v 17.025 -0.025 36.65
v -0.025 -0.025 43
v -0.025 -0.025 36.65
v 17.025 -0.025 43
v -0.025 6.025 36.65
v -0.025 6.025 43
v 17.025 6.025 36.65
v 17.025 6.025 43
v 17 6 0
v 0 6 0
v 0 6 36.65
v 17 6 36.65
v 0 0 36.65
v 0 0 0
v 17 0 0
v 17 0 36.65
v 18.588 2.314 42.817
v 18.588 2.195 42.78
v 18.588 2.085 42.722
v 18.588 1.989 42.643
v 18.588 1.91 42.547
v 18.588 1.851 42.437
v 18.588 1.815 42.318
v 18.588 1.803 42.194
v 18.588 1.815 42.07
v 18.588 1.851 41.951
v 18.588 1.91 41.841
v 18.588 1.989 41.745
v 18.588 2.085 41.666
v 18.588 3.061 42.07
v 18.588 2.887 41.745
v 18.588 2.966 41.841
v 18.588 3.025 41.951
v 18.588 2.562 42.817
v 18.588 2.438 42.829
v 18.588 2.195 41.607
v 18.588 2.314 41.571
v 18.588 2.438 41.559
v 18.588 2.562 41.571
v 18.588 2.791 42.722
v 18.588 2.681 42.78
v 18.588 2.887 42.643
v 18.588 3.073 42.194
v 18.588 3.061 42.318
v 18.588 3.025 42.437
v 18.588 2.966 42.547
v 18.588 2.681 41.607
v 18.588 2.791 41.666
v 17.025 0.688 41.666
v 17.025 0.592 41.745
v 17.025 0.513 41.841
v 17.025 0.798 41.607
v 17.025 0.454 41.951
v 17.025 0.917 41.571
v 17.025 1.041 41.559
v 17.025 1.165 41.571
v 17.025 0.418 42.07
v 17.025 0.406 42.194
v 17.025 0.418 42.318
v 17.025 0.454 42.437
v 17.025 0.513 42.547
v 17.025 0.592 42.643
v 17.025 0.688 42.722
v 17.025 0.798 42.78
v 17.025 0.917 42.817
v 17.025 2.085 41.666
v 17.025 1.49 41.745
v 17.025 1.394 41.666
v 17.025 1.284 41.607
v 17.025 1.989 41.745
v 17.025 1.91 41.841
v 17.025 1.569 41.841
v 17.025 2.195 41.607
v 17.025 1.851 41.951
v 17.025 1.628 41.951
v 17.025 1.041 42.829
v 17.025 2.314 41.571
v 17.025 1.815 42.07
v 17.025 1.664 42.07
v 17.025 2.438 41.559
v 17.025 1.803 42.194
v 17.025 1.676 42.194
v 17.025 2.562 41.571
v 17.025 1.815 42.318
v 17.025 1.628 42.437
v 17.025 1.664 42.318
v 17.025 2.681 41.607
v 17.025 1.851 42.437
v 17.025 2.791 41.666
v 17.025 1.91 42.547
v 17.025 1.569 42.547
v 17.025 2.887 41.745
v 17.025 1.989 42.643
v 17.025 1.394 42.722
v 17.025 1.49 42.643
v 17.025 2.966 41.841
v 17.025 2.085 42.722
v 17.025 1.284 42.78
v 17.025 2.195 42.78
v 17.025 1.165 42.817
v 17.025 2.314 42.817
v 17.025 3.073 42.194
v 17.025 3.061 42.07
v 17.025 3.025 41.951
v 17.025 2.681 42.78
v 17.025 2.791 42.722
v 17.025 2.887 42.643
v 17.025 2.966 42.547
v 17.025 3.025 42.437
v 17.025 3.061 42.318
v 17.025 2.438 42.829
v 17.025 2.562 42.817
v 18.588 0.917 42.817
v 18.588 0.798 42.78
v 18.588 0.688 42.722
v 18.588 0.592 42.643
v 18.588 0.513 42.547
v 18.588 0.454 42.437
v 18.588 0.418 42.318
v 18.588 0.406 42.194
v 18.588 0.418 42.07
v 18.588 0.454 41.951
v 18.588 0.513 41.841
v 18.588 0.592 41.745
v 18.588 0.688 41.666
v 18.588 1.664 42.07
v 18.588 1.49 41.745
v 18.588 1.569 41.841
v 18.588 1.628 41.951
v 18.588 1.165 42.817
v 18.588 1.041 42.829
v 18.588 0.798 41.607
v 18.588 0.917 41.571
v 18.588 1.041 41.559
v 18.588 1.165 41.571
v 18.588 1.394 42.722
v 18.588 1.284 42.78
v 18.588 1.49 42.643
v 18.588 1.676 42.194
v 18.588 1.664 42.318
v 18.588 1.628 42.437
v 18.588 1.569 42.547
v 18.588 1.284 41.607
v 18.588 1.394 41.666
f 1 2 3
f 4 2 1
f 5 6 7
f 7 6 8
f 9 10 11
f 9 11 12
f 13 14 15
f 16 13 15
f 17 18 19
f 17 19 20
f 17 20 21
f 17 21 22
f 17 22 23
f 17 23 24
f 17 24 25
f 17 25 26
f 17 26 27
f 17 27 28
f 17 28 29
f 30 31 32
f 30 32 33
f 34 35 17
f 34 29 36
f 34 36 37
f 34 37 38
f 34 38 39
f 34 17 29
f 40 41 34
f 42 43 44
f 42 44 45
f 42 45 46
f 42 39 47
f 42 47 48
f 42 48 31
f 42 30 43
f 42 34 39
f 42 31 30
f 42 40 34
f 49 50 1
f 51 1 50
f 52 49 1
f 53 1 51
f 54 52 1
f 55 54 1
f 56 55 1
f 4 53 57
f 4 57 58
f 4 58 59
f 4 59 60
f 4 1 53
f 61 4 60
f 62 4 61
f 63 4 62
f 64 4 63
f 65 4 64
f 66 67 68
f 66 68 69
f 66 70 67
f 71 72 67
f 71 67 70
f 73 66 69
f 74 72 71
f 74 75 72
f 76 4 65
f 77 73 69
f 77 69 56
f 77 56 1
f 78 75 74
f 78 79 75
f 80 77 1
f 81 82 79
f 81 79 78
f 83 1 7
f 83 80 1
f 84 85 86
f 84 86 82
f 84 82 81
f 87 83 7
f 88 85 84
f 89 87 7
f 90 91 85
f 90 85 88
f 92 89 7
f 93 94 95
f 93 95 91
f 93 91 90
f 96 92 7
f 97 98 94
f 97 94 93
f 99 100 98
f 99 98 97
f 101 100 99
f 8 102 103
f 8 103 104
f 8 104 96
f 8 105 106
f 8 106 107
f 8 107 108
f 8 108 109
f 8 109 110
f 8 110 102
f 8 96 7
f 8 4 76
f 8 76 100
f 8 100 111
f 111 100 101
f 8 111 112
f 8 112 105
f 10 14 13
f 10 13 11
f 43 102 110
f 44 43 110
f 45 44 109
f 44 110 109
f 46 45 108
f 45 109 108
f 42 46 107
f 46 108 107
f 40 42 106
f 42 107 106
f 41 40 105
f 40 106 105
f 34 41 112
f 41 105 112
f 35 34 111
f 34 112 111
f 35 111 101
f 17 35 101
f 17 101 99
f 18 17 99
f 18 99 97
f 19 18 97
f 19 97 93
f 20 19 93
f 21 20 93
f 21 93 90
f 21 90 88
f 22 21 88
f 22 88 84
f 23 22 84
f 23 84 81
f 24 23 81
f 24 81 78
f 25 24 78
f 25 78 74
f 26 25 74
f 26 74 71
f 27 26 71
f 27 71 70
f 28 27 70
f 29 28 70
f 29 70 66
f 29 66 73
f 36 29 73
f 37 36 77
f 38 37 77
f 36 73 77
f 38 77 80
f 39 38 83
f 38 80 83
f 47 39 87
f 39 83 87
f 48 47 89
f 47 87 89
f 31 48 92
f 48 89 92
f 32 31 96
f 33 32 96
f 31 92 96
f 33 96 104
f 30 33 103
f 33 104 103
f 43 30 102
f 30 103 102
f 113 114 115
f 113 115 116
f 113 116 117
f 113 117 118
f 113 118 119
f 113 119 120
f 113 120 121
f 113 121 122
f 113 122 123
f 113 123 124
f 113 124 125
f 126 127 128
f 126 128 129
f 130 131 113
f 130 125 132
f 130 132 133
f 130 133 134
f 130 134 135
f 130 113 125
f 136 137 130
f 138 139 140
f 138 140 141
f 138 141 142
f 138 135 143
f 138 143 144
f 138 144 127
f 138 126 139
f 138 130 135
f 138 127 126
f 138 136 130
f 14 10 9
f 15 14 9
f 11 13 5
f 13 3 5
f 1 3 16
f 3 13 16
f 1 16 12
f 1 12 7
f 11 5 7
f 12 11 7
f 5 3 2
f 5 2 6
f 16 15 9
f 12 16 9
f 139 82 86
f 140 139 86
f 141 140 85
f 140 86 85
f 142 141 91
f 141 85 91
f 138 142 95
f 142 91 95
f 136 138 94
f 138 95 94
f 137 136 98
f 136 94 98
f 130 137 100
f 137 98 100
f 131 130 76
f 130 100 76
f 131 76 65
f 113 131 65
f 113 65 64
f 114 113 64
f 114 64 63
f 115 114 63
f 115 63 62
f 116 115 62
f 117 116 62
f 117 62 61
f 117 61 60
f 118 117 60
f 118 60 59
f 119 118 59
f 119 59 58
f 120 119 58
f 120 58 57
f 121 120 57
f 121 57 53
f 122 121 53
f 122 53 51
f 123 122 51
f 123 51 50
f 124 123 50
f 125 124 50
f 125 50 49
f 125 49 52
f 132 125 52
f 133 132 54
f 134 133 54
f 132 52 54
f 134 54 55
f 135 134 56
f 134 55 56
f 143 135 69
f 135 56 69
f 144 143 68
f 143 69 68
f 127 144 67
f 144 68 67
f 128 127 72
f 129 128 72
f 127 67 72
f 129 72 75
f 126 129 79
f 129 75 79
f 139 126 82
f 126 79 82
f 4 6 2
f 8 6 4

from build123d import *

# Parameters (mm, degrees)
SKETCH1_W           = 17
SKETCH1_H           = 6
BOSS_EXTRUDE1_DEPTH = 43
SKETCH3_W           = 17.0508
SKETCH3_H           = 6.0508
BOSS_EXTRUDE2_DEPTH = 6.35
SKETCH4_R           = 0.635
BOSS_EXTRUDE4_DEPTH = 1.5875


with BuildPart() as part:
    # Sketch1 → Boss-Extrude1 (new body)
    with BuildSketch(Plane.XY):
        with Locations((8.5, 3)):
            Rectangle(SKETCH1_W, SKETCH1_H)
    extrude(amount=BOSS_EXTRUDE1_DEPTH)

    # Sketch3 → Boss-Extrude2 (add)
    with BuildSketch(Plane.XY.offset(43)):
        with Locations((8.5, 3)):
            Rectangle(SKETCH3_W, SKETCH3_H)
    extrude(amount=-BOSS_EXTRUDE2_DEPTH)

    # Sketch4 → Boss-Extrude4 (add)
    with BuildSketch(Plane(origin=(17, 0, 0), x_dir=(0, 0, -1), z_dir=(1, 0, 0))):
        with Locations(Location((-42.193767819, 1.041160234, 0), (0, 0, 90))):
            Circle(SKETCH4_R)
        with Locations(Location((-42.193767819, 2.438160234, 0), (0, 0, 90))):
            Circle(SKETCH4_R)
    extrude(amount=BOSS_EXTRUDE4_DEPTH)


solid = part.part
